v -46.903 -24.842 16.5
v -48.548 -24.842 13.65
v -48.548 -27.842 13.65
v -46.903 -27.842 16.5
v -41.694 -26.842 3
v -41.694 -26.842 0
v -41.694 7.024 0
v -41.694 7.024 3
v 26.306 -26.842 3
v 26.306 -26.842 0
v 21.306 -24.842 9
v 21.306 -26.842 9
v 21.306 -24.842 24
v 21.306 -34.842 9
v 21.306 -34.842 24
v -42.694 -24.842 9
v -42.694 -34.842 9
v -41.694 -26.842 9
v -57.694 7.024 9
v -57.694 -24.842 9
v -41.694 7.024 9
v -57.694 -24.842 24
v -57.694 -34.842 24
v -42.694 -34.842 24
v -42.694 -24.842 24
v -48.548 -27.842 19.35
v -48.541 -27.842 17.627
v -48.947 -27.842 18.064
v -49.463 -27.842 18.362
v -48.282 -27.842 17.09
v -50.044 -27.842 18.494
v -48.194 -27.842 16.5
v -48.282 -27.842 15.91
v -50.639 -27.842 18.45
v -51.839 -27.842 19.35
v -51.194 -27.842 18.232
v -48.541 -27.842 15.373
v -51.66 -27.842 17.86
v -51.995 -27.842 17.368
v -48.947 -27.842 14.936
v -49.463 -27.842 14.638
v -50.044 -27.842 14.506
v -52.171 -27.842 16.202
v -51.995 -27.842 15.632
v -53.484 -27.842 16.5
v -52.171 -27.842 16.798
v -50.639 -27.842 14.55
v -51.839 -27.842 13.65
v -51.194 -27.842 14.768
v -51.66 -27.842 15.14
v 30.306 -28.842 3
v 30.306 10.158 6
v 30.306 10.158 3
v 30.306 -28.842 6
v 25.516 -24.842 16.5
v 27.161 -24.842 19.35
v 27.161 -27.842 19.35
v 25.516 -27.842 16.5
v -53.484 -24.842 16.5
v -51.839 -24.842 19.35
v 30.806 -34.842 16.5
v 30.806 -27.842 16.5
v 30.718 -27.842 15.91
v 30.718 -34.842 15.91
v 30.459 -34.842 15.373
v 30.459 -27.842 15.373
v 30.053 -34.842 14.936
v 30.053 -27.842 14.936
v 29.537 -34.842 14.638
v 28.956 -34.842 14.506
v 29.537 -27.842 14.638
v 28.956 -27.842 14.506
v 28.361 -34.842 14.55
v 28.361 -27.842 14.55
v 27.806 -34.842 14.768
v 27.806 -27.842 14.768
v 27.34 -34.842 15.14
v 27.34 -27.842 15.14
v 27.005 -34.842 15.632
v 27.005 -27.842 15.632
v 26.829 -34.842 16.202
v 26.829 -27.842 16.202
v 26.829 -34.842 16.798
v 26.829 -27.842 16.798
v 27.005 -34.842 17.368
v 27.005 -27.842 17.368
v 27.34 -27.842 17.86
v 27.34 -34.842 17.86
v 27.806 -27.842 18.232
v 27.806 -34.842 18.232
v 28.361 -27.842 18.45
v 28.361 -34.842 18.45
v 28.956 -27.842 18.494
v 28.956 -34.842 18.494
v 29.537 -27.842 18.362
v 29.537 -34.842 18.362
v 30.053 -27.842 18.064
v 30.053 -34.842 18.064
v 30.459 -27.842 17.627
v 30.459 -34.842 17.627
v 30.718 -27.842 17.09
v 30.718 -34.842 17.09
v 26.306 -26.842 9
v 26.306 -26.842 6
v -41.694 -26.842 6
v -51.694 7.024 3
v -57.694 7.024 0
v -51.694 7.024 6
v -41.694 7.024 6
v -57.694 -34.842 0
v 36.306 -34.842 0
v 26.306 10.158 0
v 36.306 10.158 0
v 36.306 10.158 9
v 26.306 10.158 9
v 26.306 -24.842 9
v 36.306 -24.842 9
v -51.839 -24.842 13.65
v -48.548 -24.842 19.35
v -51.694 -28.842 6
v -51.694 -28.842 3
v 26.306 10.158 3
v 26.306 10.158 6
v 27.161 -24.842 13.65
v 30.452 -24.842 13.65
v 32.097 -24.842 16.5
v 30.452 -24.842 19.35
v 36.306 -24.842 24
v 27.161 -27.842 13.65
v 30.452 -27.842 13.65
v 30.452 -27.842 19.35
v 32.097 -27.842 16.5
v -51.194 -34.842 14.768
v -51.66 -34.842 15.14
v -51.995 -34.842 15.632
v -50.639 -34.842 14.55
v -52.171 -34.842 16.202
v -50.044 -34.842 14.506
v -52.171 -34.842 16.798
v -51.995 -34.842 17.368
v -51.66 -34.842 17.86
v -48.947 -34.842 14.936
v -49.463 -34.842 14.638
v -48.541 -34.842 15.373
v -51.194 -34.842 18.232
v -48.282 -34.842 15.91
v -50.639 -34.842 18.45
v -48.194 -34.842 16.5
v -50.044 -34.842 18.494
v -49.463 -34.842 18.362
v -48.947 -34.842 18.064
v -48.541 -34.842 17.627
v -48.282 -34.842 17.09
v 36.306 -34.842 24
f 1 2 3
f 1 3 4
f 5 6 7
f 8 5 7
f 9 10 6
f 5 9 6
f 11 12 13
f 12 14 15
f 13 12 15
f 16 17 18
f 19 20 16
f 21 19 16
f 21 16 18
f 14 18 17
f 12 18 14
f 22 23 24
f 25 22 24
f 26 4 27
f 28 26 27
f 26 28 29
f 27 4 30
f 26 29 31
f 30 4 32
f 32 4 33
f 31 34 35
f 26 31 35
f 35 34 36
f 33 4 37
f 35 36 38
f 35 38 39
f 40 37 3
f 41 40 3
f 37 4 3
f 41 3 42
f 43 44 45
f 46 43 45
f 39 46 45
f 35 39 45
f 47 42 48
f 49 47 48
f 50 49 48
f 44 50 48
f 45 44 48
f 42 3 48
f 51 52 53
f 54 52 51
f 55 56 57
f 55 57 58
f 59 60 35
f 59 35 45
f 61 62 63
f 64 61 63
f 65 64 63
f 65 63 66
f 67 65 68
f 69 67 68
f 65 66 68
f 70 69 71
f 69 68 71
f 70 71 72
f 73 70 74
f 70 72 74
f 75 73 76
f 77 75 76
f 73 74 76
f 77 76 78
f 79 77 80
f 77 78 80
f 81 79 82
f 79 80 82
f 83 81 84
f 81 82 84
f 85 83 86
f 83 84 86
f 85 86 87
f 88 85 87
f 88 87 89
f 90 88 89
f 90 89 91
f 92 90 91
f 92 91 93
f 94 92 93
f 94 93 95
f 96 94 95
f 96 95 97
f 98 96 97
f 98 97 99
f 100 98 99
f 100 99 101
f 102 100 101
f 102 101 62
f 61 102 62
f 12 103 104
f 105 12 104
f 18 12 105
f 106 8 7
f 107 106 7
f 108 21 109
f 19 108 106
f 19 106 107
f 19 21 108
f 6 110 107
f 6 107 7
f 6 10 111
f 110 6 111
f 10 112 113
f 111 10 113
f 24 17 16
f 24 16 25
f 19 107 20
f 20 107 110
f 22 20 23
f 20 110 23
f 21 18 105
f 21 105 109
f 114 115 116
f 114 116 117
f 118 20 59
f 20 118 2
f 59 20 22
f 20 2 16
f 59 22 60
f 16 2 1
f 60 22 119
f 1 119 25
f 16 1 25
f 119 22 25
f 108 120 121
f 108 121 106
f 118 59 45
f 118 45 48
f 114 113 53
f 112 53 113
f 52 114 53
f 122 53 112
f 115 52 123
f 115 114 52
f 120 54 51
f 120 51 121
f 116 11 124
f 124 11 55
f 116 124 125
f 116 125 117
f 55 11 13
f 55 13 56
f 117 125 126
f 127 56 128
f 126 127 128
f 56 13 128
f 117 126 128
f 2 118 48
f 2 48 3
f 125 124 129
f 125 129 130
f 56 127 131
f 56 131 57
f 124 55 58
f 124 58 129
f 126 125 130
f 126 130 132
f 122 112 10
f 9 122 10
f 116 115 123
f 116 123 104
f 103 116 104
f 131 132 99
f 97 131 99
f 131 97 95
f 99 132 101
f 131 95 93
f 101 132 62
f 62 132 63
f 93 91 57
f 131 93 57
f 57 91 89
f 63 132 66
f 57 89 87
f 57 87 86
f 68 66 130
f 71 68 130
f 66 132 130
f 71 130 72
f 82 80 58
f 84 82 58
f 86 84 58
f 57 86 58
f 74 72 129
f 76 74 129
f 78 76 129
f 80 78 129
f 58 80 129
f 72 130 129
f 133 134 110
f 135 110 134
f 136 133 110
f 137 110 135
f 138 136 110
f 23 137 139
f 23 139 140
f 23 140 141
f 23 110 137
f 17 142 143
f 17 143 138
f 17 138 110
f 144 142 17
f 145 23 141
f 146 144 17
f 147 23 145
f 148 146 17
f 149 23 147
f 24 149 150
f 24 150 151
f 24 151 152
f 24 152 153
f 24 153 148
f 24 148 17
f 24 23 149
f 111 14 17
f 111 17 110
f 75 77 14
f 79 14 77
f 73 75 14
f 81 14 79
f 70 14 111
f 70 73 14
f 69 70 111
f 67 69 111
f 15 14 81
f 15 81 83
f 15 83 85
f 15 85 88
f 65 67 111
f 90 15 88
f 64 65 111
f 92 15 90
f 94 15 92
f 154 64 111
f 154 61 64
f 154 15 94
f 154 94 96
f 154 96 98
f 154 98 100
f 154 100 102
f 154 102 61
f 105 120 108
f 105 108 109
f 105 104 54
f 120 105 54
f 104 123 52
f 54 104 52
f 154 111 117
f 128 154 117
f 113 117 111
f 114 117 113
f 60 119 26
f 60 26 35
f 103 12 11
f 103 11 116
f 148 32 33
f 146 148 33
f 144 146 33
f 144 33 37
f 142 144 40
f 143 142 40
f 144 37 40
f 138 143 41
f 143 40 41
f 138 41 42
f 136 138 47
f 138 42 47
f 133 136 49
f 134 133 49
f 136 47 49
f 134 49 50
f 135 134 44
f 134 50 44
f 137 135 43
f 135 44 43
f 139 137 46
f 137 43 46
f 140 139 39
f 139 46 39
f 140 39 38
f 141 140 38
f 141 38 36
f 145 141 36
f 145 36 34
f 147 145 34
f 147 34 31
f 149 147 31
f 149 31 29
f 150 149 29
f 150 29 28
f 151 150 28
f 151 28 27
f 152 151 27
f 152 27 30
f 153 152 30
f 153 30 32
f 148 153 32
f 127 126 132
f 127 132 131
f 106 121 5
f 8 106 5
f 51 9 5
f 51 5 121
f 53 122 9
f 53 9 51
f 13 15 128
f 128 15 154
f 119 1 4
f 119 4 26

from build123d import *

# Parameters (mm, degrees)
BOSS_EXTRU_1_DEPTH      = 3
BOSS_EXTRU_2_DEPTH      = 1.5
ESQUISSE3_W             = 15
ESQUISSE3_H             = 15
BOSS_EXTRU_3_DEPTH      = 10
ESQUISSE4_R             = 2
ENL_V_MAT_EXTRU_1_DEPTH = 10
ENL_V_MAT_EXTRU_2_DEPTH = 3


with BuildPart() as part:
    # Esquisse1 → Boss.-Extru.1 (new body)
    with BuildSketch(Plane.XY):
        Polygon((26.306445504, -26.841854987), (-41.693554496, -26.841854987), (-41.693554496, 7.023864035), (-57.693554496, 7.023864035), (-57.693554496, -34.841854987), (-41.693554496, -34.841854987), (26.306445504, -34.841854987), (36.306445504, -34.841854987), (36.306445504, 10.158145013), (26.306445504, 10.158145013), align=None)
    extrude(amount=BOSS_EXTRU_1_DEPTH)

    # Esquisse2 → Boss.-Extru.2 (add)
    with BuildSketch(Plane.XY.offset(3)):
        Polygon((-57.693554496, 7.023864035), (-57.693554496, -34.841854987), (36.306445504, -34.841854987), (36.306445504, 10.158145013), (30.306445504, 10.158145013), (30.306445504, -28.841854987), (-51.693554496, -28.841854987), (-51.693554496, 7.023864035), align=None)
    extrude(amount=BOSS_EXTRU_2_DEPTH)

    # Symétrie3: part across plane


with BuildPart() as part_1:
    add(part.part)
    add(part.part.mirror(Plane.XY.offset(4.5)))

    # Esquisse3 → Boss.-Extru.3 (add)
    with BuildSketch(Plane.XZ.offset(34.841854987)):
        with Locations((-50.193554496, 16.5)):
            Rectangle(ESQUISSE3_W, ESQUISSE3_H)
        with Locations((28.806445504, 16.5)):
            Rectangle(ESQUISSE3_W, ESQUISSE3_H)
    extrude(amount=-BOSS_EXTRU_3_DEPTH)

    # Esquisse4 → Enlèv. mat.-Extru.1 (cut)
    with BuildSketch(Plane(origin=(0, -24.841854987, 0), x_dir=(1, 0, 0), z_dir=(0, 1, 0))):
        with Locations((-50.193554496, -16.5)):
            Circle(ESQUISSE4_R)
        with Locations((28.806445504, -16.5)):
            Circle(ESQUISSE4_R)
    extrude(amount=-ENL_V_MAT_EXTRU_1_DEPTH, mode=Mode.SUBTRACT)

    # Esquisse5 → Enlèv. mat.-Extru.2 (cut)
    with BuildSketch(Plane(origin=(0, -24.841854987, 0), x_dir=(1, 0, 0), z_dir=(0, 1, 0))):
        Polygon((-51.839002763, -13.65), (-48.548106229, -13.65), (-46.902657962, -16.5), (-48.548106229, -19.35), (-51.839002763, -19.35), (-53.484451031, -16.5), align=None)
        Polygon((27.160997237, -13.65), (30.451893771, -13.65), (32.097342038, -16.5), (30.451893771, -19.35), (27.160997237, -19.35), (25.515548969, -16.5), align=None)
    extrude(amount=-ENL_V_MAT_EXTRU_2_DEPTH, mode=Mode.SUBTRACT)


solid = part_1.part
